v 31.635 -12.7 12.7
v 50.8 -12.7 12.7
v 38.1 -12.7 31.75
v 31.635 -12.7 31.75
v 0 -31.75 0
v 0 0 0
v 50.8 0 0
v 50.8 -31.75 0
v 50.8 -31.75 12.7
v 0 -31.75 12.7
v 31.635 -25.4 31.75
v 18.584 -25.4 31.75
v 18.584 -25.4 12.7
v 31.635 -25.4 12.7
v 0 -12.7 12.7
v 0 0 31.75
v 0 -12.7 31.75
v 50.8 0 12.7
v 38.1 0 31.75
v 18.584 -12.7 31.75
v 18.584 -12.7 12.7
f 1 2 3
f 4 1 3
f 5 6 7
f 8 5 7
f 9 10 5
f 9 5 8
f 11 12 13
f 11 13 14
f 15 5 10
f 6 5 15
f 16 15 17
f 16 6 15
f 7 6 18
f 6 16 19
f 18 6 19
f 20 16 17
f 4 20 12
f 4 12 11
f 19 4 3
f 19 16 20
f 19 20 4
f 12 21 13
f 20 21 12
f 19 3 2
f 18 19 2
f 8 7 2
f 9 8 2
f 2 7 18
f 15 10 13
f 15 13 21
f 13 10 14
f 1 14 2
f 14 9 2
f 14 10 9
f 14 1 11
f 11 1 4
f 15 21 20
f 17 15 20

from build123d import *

# Parameters (mm, degrees)
F0_W     = 50.8
F0_H     = 31.75
F1_DEPTH = 31.75
F2_W     = 19.05
F2_H     = 19.05
F3_DEPTH = 50.8
F5_DEPTH = 25.4
F6_W     = 13.051277
F6_H     = 19.05
F7_DEPTH = 12.7


with BuildPart() as f1:
    # F0 (on Front) → F1 (new body)
    with BuildSketch(Plane.XZ):
        with Locations((25.4, 15.875)):
            Rectangle(F0_W, F0_H)
    extrude(amount=F1_DEPTH)

    # F2 (on face) → F3 (cut)
    with BuildSketch(Plane.YZ.offset(50.8)):
        with Locations((-22.225, 22.225)):
            Rectangle(F2_W, F2_H)
    extrude(amount=-F3_DEPTH, mode=Mode.SUBTRACT)

    # F4 (on face) → F5 (cut)
    with BuildSketch(Plane.XZ.offset(12.7)):
        Polygon((50.8, 31.75), (38.1, 31.75), (50.8, 12.7), align=None)
    extrude(amount=-F5_DEPTH, mode=Mode.SUBTRACT)

    # F6 (on face) → F7 (join)
    with BuildSketch(Plane.XZ.offset(12.7)):
        with Locations((25.109522, 22.225)):
            Rectangle(F6_W, F6_H)
    extrude(amount=F7_DEPTH)


solid = f1.part
